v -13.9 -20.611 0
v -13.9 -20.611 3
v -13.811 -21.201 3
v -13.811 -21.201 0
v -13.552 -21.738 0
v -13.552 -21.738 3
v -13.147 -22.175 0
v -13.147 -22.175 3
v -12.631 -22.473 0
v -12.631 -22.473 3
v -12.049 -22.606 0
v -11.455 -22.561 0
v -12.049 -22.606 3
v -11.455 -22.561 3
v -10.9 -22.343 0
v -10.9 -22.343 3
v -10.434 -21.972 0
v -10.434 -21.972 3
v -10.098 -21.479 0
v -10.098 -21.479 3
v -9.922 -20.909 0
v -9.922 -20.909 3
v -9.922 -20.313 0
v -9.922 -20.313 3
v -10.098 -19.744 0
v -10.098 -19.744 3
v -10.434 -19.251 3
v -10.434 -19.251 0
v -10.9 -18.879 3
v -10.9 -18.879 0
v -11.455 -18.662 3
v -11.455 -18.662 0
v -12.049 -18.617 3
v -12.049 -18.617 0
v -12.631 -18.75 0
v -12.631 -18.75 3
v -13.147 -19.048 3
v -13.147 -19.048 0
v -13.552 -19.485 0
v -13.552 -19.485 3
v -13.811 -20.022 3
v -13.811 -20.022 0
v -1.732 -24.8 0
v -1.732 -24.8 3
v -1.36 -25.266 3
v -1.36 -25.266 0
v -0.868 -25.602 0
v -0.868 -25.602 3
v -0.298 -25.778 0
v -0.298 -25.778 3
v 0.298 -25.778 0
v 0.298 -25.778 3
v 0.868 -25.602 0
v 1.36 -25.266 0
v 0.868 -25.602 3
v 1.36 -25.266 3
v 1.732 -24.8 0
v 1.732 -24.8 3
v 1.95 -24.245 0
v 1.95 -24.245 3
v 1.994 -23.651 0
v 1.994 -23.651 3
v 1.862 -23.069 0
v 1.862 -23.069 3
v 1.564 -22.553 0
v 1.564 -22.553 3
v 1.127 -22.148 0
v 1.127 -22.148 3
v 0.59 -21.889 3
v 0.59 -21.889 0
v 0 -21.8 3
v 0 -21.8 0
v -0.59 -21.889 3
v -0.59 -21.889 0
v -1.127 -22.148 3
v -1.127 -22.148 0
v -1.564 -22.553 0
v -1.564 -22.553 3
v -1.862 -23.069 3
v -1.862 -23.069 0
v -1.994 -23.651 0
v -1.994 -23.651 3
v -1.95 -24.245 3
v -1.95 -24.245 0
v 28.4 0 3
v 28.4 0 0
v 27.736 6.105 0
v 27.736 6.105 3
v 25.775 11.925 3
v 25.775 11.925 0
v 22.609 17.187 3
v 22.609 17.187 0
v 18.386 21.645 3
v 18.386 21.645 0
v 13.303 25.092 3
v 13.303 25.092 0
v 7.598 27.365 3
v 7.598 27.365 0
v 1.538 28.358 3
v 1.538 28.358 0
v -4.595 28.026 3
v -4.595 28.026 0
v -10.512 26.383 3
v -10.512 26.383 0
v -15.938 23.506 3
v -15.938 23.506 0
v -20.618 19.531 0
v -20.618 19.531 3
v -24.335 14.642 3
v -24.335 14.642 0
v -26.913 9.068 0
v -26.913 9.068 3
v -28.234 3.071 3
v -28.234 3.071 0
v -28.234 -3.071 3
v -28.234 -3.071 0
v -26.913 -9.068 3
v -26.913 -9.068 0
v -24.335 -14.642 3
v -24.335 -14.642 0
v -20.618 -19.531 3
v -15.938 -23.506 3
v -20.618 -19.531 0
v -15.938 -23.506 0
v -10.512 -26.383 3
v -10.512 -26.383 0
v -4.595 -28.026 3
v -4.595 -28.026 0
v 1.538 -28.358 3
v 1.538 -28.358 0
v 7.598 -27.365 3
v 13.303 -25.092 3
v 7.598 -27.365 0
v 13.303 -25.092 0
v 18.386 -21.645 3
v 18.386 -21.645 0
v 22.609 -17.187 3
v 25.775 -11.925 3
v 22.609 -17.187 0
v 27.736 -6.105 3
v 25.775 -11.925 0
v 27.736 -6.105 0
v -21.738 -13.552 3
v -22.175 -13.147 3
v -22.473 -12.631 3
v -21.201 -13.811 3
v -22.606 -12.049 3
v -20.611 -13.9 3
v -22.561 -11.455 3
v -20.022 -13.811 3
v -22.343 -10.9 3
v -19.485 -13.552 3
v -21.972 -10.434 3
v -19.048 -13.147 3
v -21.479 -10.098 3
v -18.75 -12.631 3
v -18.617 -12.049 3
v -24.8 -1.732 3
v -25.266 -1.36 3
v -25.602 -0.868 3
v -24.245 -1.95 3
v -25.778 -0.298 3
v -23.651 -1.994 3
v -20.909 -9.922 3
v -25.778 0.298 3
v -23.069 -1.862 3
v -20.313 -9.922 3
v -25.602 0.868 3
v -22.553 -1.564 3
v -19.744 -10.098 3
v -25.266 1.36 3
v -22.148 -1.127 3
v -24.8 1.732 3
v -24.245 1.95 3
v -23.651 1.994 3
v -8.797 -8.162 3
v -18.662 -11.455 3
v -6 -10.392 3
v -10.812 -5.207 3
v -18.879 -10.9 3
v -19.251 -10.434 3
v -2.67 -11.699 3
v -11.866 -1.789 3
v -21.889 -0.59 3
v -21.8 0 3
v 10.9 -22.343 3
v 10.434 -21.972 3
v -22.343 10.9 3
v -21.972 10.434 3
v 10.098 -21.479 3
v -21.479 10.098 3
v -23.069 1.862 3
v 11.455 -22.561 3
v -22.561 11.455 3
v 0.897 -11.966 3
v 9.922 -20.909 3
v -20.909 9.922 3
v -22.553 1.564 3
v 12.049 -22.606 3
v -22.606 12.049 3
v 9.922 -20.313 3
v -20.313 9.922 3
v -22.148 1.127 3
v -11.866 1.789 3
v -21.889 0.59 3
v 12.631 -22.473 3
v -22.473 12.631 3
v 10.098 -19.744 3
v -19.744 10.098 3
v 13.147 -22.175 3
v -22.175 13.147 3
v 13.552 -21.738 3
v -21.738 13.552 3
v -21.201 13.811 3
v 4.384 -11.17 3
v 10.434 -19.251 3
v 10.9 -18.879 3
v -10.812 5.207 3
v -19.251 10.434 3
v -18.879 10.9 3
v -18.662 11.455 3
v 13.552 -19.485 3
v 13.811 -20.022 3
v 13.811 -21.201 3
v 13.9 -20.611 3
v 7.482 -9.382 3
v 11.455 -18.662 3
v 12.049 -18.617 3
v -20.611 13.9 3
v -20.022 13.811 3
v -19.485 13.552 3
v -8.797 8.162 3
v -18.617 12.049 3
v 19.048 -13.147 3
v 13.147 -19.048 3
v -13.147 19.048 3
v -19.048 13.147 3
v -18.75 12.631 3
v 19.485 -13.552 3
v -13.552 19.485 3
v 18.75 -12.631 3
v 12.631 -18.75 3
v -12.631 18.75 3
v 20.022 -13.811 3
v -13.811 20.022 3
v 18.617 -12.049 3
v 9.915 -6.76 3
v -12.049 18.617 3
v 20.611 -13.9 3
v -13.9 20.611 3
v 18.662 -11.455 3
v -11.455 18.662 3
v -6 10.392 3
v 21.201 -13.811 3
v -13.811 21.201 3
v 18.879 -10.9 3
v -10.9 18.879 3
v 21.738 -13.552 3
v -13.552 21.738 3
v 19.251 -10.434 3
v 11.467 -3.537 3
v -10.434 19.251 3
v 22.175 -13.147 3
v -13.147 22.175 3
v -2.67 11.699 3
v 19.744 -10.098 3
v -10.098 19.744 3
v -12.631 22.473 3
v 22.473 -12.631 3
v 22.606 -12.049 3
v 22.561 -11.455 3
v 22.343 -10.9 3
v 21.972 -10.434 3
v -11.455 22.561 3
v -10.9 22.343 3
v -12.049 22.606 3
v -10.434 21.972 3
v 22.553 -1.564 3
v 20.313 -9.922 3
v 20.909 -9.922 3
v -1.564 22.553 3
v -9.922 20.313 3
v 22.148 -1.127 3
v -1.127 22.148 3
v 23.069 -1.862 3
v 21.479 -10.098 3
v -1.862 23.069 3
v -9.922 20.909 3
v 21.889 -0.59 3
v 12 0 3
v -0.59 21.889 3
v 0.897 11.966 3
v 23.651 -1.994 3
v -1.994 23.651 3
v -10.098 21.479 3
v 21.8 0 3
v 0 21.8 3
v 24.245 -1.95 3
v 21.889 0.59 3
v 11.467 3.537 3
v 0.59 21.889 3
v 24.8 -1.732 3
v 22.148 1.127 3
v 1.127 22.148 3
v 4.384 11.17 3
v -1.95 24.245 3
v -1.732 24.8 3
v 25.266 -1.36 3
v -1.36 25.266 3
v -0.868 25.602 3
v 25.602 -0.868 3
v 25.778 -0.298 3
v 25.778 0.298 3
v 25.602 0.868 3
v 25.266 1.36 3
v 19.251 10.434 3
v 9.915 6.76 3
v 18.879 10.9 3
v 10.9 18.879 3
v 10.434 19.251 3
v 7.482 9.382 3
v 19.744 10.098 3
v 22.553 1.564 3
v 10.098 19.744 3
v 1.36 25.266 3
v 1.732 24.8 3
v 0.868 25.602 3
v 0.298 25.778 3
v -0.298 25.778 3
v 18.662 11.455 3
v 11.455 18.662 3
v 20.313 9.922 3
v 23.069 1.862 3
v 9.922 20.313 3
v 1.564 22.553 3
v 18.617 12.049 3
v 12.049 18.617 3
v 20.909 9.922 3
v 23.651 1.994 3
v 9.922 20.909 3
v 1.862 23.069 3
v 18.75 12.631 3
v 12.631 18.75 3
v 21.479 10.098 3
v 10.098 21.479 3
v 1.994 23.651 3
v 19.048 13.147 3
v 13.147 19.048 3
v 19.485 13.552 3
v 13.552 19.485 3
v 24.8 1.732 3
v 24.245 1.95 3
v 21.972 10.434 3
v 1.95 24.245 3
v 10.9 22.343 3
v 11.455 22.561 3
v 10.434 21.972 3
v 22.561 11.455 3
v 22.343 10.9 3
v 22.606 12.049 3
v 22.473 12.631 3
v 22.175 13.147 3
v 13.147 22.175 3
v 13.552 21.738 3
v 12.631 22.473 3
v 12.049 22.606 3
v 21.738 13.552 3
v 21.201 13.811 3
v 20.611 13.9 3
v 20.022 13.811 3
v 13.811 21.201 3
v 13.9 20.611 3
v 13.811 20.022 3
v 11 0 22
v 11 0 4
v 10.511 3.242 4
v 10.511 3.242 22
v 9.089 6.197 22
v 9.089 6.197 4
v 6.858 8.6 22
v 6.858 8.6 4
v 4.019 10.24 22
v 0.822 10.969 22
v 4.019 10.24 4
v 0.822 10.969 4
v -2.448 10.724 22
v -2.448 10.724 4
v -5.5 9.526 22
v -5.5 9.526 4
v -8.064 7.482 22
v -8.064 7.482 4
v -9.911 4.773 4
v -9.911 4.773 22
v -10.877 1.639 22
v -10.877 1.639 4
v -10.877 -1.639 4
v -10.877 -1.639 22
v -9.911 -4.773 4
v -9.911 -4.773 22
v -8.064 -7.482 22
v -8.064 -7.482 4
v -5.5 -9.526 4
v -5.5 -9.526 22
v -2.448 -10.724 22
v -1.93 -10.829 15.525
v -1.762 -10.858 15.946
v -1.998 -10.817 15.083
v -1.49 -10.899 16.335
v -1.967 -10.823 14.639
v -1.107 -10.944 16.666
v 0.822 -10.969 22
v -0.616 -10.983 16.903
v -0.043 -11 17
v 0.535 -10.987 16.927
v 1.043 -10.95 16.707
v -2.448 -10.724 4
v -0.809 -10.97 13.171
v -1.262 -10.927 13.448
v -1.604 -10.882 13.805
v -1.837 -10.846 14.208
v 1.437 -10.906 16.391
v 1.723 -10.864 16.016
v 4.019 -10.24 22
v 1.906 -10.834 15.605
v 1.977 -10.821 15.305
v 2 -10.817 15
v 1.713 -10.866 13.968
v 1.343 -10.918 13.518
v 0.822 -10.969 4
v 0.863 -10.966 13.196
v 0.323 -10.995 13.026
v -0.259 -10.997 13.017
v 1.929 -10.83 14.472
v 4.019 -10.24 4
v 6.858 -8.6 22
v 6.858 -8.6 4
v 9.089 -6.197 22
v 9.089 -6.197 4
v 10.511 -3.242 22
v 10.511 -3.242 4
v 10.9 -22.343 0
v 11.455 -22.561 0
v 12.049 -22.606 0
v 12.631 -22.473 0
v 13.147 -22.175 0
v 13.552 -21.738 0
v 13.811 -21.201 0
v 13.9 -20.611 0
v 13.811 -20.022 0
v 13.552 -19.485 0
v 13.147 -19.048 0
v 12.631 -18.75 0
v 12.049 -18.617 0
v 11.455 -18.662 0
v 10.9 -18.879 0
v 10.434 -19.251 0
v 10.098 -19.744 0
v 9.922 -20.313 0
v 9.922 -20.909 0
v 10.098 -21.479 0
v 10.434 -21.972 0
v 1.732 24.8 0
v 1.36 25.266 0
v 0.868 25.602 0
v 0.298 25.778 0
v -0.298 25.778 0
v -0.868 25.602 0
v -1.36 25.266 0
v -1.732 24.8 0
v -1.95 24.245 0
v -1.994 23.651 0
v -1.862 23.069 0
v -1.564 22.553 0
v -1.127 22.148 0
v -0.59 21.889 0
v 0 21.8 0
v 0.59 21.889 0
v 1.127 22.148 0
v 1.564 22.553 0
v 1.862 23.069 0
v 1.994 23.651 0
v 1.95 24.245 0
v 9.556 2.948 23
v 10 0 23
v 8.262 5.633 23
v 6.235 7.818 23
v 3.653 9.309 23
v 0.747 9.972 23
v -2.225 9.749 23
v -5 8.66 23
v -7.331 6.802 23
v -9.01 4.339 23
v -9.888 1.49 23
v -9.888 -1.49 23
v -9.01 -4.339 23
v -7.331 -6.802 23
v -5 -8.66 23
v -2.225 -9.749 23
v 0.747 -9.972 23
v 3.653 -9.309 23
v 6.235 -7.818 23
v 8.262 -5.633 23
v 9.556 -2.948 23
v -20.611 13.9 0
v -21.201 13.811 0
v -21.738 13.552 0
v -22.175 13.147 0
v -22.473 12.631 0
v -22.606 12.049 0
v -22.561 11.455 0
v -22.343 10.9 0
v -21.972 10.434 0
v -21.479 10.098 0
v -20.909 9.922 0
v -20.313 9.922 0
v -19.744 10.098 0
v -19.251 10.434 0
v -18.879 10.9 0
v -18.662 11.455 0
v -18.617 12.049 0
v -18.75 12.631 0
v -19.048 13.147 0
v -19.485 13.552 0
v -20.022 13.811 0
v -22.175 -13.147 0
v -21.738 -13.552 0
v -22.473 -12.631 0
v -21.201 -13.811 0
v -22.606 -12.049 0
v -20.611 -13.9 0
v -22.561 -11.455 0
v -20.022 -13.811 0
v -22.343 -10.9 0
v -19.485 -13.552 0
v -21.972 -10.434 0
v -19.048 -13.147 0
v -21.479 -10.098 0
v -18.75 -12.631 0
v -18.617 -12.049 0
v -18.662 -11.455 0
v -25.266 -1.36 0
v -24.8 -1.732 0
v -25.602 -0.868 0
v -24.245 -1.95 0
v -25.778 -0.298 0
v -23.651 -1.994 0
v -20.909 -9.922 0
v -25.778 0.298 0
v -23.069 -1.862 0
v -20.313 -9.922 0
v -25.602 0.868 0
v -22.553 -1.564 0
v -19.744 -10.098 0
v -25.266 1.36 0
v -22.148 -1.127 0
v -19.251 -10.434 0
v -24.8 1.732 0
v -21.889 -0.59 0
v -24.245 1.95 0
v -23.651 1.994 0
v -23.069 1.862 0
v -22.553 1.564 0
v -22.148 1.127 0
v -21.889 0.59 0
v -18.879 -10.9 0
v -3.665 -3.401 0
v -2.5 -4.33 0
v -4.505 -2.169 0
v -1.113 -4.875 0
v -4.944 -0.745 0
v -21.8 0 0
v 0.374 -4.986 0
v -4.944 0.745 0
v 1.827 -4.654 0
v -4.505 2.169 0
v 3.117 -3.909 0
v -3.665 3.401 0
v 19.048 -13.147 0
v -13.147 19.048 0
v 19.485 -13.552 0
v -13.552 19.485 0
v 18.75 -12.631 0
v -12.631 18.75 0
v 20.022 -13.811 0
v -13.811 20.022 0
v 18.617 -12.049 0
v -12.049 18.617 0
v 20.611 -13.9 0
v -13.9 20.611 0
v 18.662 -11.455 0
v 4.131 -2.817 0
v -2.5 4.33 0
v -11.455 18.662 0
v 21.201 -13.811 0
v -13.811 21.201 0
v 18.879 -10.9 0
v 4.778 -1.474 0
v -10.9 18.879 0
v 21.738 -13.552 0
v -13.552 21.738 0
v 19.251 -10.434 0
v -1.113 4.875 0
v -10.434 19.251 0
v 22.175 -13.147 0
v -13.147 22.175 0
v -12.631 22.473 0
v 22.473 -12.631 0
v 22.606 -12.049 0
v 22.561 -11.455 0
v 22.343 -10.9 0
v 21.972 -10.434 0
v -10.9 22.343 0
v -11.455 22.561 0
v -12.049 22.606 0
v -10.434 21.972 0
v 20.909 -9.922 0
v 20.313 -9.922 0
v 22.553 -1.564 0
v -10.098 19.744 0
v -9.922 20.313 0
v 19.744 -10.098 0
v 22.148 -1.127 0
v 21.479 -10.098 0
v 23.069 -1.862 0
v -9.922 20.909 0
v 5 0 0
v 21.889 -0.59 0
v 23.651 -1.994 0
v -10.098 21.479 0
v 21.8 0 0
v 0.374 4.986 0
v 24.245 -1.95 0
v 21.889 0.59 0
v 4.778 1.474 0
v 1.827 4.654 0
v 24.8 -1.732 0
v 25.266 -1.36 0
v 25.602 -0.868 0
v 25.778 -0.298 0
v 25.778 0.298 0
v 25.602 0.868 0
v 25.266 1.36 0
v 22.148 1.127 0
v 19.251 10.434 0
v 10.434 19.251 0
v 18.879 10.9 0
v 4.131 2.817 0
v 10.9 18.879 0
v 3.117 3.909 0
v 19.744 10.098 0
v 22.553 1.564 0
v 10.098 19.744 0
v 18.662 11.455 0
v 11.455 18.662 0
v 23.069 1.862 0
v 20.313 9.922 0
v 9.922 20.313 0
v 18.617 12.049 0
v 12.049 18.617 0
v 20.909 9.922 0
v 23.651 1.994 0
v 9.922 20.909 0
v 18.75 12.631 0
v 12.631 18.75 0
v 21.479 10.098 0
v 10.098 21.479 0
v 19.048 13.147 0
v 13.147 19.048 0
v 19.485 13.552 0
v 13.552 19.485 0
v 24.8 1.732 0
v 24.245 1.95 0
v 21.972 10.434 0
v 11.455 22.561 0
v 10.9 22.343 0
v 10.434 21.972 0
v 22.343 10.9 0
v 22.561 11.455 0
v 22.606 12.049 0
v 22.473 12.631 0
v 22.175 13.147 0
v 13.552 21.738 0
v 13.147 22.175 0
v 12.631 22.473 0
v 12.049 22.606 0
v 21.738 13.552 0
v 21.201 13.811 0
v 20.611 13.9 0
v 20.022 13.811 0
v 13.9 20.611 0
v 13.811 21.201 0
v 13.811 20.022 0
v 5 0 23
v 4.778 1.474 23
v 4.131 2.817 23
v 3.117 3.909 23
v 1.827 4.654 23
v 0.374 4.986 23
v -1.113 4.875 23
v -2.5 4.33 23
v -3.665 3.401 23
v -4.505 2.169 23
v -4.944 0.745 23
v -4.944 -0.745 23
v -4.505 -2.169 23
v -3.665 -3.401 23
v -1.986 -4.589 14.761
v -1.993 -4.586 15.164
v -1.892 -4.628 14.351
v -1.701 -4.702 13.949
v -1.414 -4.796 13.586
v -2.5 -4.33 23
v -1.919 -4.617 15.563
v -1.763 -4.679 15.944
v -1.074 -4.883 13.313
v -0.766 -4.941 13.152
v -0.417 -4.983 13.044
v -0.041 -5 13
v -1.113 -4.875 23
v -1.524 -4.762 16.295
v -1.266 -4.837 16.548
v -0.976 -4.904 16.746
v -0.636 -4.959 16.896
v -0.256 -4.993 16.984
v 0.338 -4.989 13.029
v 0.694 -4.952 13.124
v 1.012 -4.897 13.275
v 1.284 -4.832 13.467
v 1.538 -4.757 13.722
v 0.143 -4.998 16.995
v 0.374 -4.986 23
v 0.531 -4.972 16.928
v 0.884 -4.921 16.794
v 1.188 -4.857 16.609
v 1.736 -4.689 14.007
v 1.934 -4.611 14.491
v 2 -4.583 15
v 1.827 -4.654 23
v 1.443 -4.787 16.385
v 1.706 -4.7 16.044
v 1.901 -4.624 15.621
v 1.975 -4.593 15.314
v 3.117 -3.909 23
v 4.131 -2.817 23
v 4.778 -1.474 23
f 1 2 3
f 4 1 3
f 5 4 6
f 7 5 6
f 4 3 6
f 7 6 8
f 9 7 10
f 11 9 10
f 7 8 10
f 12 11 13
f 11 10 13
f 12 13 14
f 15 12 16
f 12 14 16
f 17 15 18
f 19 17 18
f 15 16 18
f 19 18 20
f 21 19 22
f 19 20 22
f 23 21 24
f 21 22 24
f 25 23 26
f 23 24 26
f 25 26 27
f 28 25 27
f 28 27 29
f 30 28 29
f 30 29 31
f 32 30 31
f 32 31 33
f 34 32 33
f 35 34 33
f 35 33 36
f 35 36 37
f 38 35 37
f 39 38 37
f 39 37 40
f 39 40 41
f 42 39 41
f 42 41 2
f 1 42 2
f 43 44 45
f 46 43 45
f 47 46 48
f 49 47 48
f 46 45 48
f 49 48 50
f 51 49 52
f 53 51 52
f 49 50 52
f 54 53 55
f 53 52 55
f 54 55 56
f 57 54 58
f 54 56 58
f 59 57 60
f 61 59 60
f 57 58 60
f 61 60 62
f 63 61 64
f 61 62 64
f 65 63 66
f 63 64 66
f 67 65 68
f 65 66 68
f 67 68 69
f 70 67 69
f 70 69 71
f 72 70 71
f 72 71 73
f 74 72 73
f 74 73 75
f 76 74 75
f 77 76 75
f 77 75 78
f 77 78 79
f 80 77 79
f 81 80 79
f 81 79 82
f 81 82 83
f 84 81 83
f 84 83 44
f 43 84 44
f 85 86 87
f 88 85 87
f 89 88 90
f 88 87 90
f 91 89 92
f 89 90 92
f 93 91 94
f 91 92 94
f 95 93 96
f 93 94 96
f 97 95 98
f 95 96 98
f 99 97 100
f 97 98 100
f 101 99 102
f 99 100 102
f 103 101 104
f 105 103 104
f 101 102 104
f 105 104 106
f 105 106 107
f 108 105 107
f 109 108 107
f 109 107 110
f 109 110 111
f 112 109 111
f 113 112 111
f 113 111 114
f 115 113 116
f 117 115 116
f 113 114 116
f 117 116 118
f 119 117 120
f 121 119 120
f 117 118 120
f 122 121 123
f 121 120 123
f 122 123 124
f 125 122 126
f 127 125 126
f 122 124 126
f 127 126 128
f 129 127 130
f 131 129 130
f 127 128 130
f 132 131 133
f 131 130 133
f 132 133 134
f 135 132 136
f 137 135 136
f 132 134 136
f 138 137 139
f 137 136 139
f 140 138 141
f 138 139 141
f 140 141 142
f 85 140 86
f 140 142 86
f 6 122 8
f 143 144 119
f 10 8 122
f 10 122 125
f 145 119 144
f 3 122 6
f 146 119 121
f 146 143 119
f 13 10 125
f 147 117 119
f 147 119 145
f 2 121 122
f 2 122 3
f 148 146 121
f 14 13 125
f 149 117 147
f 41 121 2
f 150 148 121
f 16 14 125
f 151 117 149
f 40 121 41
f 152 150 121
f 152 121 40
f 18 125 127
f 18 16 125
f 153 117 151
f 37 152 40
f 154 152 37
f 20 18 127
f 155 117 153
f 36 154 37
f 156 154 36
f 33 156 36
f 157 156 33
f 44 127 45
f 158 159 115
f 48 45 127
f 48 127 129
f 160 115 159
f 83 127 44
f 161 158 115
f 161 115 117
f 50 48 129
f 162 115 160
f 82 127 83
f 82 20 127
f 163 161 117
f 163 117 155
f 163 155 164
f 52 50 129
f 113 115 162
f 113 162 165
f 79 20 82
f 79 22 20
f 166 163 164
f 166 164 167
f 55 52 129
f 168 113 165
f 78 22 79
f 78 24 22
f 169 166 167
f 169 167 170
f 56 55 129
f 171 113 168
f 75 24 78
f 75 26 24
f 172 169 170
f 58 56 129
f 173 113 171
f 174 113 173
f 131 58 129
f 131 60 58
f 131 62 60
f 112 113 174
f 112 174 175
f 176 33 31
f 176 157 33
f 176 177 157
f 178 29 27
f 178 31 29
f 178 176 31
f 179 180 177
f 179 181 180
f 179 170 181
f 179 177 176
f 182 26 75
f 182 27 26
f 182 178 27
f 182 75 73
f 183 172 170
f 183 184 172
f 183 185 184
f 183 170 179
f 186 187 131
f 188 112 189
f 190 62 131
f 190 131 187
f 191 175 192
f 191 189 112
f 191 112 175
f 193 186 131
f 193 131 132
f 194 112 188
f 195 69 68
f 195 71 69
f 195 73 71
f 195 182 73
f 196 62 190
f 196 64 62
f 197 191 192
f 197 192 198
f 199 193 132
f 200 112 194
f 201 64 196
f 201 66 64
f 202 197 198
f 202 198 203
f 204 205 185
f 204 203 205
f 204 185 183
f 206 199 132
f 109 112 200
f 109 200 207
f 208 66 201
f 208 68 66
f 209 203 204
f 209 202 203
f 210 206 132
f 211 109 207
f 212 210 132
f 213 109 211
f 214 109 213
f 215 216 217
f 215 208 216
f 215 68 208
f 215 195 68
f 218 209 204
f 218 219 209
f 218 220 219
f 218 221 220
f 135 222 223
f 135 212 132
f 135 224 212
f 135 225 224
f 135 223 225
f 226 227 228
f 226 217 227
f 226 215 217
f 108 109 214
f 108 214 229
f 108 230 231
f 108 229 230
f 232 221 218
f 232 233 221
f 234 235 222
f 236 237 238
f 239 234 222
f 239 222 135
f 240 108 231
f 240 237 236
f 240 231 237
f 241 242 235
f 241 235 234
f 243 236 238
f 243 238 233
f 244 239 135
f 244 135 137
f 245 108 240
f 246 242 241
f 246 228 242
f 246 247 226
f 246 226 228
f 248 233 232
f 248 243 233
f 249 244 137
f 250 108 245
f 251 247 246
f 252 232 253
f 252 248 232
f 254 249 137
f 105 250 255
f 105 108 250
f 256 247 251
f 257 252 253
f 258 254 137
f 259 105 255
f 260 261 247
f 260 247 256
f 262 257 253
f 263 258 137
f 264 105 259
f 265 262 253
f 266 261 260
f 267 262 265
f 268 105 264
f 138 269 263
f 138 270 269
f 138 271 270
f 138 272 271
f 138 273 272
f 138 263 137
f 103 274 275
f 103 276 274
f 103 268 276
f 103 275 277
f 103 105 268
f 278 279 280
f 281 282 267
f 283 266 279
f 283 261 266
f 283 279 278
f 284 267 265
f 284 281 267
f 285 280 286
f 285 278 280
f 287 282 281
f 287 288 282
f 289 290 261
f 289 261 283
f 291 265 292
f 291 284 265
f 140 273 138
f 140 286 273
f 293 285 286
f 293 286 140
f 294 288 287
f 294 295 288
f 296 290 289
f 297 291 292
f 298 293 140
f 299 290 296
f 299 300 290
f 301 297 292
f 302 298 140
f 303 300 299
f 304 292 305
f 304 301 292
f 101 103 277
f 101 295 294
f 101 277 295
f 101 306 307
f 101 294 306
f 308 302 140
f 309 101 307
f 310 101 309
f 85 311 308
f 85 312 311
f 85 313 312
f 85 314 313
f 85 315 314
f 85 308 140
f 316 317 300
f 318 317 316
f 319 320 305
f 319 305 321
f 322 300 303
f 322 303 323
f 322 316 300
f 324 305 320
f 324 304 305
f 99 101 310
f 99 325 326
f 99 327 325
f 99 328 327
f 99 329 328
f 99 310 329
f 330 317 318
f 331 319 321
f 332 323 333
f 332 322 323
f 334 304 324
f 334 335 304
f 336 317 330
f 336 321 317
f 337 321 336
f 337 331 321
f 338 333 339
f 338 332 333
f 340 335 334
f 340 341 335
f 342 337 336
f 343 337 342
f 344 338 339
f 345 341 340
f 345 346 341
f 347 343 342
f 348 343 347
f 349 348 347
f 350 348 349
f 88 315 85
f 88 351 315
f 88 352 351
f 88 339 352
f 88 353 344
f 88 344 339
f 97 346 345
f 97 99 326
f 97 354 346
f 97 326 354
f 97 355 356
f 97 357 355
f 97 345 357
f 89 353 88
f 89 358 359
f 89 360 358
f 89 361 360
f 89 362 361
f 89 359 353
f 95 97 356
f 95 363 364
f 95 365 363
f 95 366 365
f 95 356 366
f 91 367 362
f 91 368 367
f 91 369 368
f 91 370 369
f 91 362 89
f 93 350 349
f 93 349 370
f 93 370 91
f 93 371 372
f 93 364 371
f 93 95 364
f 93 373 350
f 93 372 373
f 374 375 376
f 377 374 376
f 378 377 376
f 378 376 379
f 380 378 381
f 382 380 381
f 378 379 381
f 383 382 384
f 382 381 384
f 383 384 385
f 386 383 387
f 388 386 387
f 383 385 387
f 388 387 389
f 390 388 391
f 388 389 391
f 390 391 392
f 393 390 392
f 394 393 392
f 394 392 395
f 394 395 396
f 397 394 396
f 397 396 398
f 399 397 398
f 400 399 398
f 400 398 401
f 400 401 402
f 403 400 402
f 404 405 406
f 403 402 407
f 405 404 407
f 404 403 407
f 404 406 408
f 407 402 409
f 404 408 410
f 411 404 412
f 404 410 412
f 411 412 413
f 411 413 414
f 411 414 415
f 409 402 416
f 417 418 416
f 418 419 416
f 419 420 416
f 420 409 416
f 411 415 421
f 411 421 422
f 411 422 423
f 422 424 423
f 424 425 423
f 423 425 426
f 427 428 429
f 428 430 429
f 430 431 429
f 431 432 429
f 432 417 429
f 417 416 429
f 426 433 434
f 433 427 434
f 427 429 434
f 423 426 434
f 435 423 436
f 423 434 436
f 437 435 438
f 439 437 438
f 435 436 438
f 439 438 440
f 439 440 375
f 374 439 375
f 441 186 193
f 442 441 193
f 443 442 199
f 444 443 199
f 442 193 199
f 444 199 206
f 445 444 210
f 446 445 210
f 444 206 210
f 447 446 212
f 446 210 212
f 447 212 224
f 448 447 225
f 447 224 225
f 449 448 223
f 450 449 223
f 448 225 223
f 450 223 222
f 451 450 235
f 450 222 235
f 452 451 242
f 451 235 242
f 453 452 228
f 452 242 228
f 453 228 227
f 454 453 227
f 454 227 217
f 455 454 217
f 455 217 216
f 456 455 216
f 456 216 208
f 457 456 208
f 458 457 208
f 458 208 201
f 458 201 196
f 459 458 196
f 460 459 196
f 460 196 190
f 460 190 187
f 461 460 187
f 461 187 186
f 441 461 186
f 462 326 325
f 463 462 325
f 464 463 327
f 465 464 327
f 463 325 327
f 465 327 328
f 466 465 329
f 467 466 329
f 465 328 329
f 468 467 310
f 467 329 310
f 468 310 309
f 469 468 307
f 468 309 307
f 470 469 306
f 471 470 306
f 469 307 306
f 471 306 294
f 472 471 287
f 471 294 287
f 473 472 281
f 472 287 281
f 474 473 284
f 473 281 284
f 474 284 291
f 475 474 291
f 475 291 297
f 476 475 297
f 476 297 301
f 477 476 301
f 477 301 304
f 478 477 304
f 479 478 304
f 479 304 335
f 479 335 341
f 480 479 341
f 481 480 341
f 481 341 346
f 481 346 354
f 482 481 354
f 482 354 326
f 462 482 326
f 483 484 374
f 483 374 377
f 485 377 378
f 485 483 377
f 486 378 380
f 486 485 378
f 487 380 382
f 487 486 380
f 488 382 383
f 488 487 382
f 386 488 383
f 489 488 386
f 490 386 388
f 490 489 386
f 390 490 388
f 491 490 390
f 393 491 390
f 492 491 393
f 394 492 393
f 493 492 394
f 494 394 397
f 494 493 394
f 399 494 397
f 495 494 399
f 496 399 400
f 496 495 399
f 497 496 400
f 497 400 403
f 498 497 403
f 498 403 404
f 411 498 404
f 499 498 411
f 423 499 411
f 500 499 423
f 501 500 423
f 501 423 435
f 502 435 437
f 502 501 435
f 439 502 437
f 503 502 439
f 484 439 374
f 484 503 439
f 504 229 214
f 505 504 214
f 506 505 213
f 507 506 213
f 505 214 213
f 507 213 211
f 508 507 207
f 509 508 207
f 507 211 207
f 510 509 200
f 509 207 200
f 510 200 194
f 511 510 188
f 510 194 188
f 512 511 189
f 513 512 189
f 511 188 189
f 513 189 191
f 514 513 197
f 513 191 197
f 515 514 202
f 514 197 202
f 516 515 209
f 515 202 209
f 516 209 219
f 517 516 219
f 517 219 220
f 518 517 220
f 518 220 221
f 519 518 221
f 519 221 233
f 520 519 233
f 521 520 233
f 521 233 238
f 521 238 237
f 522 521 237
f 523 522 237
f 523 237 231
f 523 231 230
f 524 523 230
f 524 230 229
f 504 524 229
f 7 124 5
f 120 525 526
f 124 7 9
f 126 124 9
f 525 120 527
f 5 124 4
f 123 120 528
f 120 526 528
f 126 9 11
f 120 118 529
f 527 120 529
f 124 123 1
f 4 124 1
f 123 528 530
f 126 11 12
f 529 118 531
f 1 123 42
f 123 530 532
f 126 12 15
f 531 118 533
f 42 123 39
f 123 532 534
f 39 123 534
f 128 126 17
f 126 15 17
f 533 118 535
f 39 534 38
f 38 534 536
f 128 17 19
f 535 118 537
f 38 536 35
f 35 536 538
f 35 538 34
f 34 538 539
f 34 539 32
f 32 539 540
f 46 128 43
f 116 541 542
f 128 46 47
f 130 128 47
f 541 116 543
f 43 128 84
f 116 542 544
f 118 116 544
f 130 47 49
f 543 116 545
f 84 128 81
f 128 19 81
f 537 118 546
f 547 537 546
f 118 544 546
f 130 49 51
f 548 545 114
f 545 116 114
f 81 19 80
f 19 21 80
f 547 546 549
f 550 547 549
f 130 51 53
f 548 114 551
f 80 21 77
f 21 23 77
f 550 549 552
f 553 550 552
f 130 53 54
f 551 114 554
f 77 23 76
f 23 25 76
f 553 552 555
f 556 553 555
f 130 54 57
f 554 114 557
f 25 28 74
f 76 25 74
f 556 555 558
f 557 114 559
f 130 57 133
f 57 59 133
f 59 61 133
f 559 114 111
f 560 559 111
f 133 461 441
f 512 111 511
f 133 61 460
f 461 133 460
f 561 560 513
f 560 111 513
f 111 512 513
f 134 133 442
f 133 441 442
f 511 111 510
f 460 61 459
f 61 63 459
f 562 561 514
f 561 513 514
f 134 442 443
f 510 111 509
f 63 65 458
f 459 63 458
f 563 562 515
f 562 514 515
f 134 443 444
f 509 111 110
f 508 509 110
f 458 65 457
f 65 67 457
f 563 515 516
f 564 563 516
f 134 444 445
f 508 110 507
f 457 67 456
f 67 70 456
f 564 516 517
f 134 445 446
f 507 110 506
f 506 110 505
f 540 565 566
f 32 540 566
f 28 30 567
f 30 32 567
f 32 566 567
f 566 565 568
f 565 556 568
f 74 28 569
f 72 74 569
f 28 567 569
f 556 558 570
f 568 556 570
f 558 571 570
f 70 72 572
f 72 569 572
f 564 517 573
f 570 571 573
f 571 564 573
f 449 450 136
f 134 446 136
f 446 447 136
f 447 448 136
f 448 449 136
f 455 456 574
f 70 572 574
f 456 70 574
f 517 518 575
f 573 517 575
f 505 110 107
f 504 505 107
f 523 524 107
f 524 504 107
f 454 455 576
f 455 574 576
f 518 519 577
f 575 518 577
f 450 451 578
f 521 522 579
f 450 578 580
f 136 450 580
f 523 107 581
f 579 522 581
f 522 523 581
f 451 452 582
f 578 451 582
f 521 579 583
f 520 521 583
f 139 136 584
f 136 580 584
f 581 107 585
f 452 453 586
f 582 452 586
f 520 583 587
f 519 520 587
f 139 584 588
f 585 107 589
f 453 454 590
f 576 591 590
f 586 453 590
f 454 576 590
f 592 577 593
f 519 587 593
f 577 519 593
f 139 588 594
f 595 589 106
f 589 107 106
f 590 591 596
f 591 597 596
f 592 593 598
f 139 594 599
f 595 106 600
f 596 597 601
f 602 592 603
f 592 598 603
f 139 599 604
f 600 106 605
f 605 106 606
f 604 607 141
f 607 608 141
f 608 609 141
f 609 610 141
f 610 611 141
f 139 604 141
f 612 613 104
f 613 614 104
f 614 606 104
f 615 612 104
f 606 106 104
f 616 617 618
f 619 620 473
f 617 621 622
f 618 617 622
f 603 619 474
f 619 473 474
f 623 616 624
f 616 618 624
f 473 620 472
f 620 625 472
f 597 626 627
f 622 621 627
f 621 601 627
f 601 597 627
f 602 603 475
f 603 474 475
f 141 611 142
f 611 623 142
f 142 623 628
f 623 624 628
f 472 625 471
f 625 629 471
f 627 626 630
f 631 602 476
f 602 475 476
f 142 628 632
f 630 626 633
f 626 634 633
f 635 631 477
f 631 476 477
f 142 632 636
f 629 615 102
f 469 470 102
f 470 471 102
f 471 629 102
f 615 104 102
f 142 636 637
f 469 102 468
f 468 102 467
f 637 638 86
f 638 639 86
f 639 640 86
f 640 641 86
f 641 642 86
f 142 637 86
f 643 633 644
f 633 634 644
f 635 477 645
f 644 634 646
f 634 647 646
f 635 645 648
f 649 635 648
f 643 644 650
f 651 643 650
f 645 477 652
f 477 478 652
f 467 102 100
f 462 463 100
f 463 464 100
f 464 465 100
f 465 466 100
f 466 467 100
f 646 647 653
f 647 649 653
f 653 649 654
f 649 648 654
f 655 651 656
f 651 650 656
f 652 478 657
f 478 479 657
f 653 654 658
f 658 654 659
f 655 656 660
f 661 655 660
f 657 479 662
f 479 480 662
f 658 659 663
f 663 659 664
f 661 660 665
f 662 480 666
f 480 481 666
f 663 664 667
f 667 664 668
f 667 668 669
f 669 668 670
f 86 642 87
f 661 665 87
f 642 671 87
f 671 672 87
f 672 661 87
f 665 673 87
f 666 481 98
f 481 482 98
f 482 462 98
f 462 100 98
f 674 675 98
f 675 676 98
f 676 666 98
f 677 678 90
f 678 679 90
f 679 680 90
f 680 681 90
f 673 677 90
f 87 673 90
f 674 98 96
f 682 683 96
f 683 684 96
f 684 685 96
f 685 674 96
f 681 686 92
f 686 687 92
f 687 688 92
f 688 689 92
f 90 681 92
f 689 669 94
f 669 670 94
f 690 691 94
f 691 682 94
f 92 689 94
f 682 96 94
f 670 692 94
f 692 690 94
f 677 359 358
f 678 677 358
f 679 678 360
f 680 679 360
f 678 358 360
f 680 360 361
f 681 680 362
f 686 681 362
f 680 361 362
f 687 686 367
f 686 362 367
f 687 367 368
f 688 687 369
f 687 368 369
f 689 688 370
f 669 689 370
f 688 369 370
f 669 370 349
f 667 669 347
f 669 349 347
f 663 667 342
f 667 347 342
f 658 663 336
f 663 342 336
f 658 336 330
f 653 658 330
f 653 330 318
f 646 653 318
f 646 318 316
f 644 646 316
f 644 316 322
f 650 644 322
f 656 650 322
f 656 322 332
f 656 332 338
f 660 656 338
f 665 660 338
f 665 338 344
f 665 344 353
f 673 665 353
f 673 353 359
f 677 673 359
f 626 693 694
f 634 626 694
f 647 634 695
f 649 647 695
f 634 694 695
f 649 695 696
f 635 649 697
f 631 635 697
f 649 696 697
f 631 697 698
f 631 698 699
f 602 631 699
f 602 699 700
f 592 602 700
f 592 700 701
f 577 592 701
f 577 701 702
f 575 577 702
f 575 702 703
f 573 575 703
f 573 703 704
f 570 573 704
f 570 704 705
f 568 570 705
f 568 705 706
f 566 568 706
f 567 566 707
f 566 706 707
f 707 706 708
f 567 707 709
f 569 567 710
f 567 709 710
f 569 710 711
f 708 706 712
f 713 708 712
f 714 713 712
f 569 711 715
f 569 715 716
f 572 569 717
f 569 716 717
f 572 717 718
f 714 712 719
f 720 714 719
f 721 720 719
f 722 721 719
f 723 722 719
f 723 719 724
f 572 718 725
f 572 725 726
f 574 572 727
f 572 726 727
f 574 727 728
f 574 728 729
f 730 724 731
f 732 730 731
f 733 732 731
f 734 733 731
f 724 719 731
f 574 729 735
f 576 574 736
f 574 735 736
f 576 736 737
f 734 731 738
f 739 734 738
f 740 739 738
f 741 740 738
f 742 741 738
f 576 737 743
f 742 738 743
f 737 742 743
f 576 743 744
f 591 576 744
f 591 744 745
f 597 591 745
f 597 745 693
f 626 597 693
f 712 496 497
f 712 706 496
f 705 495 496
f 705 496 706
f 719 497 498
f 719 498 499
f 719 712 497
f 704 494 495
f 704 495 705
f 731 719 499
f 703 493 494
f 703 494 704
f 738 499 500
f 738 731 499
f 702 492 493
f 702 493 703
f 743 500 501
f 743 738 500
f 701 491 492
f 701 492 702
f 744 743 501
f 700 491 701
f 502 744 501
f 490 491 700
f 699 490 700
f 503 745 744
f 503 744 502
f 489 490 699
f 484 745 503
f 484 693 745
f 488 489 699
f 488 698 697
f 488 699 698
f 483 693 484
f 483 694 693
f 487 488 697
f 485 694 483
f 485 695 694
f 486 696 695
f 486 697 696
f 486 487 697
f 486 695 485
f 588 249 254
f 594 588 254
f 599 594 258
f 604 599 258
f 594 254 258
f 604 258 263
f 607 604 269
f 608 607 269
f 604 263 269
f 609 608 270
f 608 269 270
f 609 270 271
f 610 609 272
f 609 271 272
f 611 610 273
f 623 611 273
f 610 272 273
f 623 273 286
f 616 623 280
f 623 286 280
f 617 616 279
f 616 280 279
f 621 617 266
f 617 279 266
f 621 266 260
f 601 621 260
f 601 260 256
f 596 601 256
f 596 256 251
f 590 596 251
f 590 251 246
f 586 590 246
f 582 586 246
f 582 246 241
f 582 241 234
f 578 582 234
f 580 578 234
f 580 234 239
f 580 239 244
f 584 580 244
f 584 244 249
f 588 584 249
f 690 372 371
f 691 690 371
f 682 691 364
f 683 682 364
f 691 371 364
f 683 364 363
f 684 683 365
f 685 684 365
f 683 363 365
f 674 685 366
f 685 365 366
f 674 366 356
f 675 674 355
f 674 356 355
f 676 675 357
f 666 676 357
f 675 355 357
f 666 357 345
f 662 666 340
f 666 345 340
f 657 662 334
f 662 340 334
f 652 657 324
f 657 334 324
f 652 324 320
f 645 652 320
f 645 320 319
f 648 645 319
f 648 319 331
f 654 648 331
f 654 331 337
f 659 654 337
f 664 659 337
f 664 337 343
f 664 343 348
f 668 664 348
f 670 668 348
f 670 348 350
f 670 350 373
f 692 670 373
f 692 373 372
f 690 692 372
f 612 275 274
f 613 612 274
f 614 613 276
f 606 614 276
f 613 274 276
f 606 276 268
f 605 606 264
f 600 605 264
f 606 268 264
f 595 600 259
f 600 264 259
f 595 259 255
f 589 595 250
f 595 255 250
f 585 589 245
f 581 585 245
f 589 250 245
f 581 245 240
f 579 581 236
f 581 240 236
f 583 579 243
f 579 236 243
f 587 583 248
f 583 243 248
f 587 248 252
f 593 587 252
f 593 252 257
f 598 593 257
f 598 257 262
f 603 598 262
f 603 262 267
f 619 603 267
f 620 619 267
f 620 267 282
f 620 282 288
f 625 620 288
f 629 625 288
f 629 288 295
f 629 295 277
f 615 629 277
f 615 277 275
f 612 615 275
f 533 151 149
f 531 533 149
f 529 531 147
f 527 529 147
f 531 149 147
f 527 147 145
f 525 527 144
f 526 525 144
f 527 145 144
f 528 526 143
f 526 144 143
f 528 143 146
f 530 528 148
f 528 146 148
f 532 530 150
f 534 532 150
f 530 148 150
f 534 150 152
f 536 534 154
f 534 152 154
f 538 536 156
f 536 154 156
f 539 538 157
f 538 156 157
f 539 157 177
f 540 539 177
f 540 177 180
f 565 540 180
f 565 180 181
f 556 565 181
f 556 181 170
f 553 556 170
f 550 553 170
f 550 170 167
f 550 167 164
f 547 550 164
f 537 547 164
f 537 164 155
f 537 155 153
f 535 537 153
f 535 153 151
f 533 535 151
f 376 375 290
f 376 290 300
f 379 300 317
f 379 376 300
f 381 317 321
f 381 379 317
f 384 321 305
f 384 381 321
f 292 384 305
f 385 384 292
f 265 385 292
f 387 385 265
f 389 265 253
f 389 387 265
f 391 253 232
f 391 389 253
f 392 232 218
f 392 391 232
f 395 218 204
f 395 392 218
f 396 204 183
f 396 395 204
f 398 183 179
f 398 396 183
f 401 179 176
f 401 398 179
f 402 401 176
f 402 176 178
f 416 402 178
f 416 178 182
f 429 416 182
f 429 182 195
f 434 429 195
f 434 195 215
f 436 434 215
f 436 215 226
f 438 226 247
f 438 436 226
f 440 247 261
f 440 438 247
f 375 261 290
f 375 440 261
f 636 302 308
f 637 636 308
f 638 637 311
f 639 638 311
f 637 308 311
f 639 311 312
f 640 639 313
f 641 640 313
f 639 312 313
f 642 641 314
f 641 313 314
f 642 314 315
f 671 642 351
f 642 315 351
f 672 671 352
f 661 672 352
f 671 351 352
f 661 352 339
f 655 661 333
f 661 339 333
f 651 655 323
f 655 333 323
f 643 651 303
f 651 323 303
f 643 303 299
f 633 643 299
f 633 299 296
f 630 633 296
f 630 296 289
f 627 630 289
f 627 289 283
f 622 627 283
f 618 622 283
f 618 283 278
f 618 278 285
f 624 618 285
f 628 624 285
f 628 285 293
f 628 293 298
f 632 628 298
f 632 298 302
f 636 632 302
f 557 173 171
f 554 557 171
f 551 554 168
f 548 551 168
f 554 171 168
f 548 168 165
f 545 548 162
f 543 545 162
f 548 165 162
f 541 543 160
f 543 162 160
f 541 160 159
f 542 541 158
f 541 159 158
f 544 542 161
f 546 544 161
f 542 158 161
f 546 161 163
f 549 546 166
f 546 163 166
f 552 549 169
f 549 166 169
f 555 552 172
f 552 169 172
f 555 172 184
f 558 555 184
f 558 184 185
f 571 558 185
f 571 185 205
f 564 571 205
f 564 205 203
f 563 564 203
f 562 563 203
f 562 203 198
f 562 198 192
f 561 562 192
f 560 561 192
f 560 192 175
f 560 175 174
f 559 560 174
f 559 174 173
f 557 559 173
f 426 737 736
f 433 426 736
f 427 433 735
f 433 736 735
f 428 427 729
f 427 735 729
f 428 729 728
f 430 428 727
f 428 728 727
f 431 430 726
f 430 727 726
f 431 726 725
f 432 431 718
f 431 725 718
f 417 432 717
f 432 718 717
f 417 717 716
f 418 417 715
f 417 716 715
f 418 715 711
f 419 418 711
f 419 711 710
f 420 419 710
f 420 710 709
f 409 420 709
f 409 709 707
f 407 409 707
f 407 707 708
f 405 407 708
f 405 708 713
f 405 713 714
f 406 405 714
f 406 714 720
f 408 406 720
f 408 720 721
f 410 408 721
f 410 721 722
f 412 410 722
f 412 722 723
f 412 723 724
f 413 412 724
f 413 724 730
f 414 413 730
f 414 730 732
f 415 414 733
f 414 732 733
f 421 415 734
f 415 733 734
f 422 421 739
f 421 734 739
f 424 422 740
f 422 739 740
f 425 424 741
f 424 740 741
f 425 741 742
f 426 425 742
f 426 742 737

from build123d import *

# Parameters (mm, degrees)
SKETCH1_R           = 28.4
BOSS_EXTRUDE1_DEPTH = 3
SKETCH2_R           = 11
BOSS_EXTRUDE2_DEPTH = 20
SKETCH3_R           = 5
CUT_EXTRUDE1_DEPTH  = 24
SKETCH4_R           = 2
CUT_EXTRUDE2_DEPTH  = 15
CHAMFER1_SIZE       = 1
SKETCH5_R           = 2
CUT_EXTRUDE5_DEPTH  = 4.0000001
CIRPATTERN2_COUNT   = 12


with BuildPart() as part:
    # Sketch1 → Boss-Extrude1 (new body)
    with BuildSketch(Plane.XY):
        Circle(SKETCH1_R)
    extrude(amount=BOSS_EXTRUDE1_DEPTH)

    # Sketch2 → Boss-Extrude2 (add)
    with BuildSketch(Plane.XY.offset(3)):
        Circle(SKETCH2_R)
    extrude(amount=BOSS_EXTRUDE2_DEPTH)

    # Sketch3 → Cut-Extrude1 (cut, through all)
    with BuildSketch(Plane.XY.offset(23)):
        Circle(SKETCH3_R)
    extrude(amount=-CUT_EXTRUDE1_DEPTH, mode=Mode.SUBTRACT)

    # Sketch4 → Cut-Extrude2 (cut)
    with BuildSketch(Plane(origin=(0, 0, 0), x_dir=(1, 0, 0), z_dir=(0, 1, 0))):
        with Locations((0, -15)):
            Circle(SKETCH4_R)
    extrude(amount=-CUT_EXTRUDE2_DEPTH, mode=Mode.SUBTRACT)

    # Chamfer1
    chamfer1_edges = [part.edges().sort_by_distance(p)[0] for p in [
        (-11, 0, 3),
        (-11, 0, 23),
    ]]
    chamfer(chamfer1_edges, length=CHAMFER1_SIZE)

    # Sketch5 → Cut-Extrude5 (cut, through all)
    with BuildSketch(Plane.XY.offset(3)):
        with Locations((11.9, 20.61140461)):
            Circle(SKETCH5_R)
    cut_extrude5 = extrude(amount=-CUT_EXTRUDE5_DEPTH, mode=Mode.SUBTRACT)

    # CirPattern2: Cut-Extrude5 ×12 about axis
    cirpattern2_axis = Axis((0, 0, 0), (0, 0, 1))
    for i in range(1, CIRPATTERN2_COUNT):
        add(cut_extrude5.rotate(cirpattern2_axis, i * 360 / CIRPATTERN2_COUNT), mode=Mode.SUBTRACT)


solid = part.part
